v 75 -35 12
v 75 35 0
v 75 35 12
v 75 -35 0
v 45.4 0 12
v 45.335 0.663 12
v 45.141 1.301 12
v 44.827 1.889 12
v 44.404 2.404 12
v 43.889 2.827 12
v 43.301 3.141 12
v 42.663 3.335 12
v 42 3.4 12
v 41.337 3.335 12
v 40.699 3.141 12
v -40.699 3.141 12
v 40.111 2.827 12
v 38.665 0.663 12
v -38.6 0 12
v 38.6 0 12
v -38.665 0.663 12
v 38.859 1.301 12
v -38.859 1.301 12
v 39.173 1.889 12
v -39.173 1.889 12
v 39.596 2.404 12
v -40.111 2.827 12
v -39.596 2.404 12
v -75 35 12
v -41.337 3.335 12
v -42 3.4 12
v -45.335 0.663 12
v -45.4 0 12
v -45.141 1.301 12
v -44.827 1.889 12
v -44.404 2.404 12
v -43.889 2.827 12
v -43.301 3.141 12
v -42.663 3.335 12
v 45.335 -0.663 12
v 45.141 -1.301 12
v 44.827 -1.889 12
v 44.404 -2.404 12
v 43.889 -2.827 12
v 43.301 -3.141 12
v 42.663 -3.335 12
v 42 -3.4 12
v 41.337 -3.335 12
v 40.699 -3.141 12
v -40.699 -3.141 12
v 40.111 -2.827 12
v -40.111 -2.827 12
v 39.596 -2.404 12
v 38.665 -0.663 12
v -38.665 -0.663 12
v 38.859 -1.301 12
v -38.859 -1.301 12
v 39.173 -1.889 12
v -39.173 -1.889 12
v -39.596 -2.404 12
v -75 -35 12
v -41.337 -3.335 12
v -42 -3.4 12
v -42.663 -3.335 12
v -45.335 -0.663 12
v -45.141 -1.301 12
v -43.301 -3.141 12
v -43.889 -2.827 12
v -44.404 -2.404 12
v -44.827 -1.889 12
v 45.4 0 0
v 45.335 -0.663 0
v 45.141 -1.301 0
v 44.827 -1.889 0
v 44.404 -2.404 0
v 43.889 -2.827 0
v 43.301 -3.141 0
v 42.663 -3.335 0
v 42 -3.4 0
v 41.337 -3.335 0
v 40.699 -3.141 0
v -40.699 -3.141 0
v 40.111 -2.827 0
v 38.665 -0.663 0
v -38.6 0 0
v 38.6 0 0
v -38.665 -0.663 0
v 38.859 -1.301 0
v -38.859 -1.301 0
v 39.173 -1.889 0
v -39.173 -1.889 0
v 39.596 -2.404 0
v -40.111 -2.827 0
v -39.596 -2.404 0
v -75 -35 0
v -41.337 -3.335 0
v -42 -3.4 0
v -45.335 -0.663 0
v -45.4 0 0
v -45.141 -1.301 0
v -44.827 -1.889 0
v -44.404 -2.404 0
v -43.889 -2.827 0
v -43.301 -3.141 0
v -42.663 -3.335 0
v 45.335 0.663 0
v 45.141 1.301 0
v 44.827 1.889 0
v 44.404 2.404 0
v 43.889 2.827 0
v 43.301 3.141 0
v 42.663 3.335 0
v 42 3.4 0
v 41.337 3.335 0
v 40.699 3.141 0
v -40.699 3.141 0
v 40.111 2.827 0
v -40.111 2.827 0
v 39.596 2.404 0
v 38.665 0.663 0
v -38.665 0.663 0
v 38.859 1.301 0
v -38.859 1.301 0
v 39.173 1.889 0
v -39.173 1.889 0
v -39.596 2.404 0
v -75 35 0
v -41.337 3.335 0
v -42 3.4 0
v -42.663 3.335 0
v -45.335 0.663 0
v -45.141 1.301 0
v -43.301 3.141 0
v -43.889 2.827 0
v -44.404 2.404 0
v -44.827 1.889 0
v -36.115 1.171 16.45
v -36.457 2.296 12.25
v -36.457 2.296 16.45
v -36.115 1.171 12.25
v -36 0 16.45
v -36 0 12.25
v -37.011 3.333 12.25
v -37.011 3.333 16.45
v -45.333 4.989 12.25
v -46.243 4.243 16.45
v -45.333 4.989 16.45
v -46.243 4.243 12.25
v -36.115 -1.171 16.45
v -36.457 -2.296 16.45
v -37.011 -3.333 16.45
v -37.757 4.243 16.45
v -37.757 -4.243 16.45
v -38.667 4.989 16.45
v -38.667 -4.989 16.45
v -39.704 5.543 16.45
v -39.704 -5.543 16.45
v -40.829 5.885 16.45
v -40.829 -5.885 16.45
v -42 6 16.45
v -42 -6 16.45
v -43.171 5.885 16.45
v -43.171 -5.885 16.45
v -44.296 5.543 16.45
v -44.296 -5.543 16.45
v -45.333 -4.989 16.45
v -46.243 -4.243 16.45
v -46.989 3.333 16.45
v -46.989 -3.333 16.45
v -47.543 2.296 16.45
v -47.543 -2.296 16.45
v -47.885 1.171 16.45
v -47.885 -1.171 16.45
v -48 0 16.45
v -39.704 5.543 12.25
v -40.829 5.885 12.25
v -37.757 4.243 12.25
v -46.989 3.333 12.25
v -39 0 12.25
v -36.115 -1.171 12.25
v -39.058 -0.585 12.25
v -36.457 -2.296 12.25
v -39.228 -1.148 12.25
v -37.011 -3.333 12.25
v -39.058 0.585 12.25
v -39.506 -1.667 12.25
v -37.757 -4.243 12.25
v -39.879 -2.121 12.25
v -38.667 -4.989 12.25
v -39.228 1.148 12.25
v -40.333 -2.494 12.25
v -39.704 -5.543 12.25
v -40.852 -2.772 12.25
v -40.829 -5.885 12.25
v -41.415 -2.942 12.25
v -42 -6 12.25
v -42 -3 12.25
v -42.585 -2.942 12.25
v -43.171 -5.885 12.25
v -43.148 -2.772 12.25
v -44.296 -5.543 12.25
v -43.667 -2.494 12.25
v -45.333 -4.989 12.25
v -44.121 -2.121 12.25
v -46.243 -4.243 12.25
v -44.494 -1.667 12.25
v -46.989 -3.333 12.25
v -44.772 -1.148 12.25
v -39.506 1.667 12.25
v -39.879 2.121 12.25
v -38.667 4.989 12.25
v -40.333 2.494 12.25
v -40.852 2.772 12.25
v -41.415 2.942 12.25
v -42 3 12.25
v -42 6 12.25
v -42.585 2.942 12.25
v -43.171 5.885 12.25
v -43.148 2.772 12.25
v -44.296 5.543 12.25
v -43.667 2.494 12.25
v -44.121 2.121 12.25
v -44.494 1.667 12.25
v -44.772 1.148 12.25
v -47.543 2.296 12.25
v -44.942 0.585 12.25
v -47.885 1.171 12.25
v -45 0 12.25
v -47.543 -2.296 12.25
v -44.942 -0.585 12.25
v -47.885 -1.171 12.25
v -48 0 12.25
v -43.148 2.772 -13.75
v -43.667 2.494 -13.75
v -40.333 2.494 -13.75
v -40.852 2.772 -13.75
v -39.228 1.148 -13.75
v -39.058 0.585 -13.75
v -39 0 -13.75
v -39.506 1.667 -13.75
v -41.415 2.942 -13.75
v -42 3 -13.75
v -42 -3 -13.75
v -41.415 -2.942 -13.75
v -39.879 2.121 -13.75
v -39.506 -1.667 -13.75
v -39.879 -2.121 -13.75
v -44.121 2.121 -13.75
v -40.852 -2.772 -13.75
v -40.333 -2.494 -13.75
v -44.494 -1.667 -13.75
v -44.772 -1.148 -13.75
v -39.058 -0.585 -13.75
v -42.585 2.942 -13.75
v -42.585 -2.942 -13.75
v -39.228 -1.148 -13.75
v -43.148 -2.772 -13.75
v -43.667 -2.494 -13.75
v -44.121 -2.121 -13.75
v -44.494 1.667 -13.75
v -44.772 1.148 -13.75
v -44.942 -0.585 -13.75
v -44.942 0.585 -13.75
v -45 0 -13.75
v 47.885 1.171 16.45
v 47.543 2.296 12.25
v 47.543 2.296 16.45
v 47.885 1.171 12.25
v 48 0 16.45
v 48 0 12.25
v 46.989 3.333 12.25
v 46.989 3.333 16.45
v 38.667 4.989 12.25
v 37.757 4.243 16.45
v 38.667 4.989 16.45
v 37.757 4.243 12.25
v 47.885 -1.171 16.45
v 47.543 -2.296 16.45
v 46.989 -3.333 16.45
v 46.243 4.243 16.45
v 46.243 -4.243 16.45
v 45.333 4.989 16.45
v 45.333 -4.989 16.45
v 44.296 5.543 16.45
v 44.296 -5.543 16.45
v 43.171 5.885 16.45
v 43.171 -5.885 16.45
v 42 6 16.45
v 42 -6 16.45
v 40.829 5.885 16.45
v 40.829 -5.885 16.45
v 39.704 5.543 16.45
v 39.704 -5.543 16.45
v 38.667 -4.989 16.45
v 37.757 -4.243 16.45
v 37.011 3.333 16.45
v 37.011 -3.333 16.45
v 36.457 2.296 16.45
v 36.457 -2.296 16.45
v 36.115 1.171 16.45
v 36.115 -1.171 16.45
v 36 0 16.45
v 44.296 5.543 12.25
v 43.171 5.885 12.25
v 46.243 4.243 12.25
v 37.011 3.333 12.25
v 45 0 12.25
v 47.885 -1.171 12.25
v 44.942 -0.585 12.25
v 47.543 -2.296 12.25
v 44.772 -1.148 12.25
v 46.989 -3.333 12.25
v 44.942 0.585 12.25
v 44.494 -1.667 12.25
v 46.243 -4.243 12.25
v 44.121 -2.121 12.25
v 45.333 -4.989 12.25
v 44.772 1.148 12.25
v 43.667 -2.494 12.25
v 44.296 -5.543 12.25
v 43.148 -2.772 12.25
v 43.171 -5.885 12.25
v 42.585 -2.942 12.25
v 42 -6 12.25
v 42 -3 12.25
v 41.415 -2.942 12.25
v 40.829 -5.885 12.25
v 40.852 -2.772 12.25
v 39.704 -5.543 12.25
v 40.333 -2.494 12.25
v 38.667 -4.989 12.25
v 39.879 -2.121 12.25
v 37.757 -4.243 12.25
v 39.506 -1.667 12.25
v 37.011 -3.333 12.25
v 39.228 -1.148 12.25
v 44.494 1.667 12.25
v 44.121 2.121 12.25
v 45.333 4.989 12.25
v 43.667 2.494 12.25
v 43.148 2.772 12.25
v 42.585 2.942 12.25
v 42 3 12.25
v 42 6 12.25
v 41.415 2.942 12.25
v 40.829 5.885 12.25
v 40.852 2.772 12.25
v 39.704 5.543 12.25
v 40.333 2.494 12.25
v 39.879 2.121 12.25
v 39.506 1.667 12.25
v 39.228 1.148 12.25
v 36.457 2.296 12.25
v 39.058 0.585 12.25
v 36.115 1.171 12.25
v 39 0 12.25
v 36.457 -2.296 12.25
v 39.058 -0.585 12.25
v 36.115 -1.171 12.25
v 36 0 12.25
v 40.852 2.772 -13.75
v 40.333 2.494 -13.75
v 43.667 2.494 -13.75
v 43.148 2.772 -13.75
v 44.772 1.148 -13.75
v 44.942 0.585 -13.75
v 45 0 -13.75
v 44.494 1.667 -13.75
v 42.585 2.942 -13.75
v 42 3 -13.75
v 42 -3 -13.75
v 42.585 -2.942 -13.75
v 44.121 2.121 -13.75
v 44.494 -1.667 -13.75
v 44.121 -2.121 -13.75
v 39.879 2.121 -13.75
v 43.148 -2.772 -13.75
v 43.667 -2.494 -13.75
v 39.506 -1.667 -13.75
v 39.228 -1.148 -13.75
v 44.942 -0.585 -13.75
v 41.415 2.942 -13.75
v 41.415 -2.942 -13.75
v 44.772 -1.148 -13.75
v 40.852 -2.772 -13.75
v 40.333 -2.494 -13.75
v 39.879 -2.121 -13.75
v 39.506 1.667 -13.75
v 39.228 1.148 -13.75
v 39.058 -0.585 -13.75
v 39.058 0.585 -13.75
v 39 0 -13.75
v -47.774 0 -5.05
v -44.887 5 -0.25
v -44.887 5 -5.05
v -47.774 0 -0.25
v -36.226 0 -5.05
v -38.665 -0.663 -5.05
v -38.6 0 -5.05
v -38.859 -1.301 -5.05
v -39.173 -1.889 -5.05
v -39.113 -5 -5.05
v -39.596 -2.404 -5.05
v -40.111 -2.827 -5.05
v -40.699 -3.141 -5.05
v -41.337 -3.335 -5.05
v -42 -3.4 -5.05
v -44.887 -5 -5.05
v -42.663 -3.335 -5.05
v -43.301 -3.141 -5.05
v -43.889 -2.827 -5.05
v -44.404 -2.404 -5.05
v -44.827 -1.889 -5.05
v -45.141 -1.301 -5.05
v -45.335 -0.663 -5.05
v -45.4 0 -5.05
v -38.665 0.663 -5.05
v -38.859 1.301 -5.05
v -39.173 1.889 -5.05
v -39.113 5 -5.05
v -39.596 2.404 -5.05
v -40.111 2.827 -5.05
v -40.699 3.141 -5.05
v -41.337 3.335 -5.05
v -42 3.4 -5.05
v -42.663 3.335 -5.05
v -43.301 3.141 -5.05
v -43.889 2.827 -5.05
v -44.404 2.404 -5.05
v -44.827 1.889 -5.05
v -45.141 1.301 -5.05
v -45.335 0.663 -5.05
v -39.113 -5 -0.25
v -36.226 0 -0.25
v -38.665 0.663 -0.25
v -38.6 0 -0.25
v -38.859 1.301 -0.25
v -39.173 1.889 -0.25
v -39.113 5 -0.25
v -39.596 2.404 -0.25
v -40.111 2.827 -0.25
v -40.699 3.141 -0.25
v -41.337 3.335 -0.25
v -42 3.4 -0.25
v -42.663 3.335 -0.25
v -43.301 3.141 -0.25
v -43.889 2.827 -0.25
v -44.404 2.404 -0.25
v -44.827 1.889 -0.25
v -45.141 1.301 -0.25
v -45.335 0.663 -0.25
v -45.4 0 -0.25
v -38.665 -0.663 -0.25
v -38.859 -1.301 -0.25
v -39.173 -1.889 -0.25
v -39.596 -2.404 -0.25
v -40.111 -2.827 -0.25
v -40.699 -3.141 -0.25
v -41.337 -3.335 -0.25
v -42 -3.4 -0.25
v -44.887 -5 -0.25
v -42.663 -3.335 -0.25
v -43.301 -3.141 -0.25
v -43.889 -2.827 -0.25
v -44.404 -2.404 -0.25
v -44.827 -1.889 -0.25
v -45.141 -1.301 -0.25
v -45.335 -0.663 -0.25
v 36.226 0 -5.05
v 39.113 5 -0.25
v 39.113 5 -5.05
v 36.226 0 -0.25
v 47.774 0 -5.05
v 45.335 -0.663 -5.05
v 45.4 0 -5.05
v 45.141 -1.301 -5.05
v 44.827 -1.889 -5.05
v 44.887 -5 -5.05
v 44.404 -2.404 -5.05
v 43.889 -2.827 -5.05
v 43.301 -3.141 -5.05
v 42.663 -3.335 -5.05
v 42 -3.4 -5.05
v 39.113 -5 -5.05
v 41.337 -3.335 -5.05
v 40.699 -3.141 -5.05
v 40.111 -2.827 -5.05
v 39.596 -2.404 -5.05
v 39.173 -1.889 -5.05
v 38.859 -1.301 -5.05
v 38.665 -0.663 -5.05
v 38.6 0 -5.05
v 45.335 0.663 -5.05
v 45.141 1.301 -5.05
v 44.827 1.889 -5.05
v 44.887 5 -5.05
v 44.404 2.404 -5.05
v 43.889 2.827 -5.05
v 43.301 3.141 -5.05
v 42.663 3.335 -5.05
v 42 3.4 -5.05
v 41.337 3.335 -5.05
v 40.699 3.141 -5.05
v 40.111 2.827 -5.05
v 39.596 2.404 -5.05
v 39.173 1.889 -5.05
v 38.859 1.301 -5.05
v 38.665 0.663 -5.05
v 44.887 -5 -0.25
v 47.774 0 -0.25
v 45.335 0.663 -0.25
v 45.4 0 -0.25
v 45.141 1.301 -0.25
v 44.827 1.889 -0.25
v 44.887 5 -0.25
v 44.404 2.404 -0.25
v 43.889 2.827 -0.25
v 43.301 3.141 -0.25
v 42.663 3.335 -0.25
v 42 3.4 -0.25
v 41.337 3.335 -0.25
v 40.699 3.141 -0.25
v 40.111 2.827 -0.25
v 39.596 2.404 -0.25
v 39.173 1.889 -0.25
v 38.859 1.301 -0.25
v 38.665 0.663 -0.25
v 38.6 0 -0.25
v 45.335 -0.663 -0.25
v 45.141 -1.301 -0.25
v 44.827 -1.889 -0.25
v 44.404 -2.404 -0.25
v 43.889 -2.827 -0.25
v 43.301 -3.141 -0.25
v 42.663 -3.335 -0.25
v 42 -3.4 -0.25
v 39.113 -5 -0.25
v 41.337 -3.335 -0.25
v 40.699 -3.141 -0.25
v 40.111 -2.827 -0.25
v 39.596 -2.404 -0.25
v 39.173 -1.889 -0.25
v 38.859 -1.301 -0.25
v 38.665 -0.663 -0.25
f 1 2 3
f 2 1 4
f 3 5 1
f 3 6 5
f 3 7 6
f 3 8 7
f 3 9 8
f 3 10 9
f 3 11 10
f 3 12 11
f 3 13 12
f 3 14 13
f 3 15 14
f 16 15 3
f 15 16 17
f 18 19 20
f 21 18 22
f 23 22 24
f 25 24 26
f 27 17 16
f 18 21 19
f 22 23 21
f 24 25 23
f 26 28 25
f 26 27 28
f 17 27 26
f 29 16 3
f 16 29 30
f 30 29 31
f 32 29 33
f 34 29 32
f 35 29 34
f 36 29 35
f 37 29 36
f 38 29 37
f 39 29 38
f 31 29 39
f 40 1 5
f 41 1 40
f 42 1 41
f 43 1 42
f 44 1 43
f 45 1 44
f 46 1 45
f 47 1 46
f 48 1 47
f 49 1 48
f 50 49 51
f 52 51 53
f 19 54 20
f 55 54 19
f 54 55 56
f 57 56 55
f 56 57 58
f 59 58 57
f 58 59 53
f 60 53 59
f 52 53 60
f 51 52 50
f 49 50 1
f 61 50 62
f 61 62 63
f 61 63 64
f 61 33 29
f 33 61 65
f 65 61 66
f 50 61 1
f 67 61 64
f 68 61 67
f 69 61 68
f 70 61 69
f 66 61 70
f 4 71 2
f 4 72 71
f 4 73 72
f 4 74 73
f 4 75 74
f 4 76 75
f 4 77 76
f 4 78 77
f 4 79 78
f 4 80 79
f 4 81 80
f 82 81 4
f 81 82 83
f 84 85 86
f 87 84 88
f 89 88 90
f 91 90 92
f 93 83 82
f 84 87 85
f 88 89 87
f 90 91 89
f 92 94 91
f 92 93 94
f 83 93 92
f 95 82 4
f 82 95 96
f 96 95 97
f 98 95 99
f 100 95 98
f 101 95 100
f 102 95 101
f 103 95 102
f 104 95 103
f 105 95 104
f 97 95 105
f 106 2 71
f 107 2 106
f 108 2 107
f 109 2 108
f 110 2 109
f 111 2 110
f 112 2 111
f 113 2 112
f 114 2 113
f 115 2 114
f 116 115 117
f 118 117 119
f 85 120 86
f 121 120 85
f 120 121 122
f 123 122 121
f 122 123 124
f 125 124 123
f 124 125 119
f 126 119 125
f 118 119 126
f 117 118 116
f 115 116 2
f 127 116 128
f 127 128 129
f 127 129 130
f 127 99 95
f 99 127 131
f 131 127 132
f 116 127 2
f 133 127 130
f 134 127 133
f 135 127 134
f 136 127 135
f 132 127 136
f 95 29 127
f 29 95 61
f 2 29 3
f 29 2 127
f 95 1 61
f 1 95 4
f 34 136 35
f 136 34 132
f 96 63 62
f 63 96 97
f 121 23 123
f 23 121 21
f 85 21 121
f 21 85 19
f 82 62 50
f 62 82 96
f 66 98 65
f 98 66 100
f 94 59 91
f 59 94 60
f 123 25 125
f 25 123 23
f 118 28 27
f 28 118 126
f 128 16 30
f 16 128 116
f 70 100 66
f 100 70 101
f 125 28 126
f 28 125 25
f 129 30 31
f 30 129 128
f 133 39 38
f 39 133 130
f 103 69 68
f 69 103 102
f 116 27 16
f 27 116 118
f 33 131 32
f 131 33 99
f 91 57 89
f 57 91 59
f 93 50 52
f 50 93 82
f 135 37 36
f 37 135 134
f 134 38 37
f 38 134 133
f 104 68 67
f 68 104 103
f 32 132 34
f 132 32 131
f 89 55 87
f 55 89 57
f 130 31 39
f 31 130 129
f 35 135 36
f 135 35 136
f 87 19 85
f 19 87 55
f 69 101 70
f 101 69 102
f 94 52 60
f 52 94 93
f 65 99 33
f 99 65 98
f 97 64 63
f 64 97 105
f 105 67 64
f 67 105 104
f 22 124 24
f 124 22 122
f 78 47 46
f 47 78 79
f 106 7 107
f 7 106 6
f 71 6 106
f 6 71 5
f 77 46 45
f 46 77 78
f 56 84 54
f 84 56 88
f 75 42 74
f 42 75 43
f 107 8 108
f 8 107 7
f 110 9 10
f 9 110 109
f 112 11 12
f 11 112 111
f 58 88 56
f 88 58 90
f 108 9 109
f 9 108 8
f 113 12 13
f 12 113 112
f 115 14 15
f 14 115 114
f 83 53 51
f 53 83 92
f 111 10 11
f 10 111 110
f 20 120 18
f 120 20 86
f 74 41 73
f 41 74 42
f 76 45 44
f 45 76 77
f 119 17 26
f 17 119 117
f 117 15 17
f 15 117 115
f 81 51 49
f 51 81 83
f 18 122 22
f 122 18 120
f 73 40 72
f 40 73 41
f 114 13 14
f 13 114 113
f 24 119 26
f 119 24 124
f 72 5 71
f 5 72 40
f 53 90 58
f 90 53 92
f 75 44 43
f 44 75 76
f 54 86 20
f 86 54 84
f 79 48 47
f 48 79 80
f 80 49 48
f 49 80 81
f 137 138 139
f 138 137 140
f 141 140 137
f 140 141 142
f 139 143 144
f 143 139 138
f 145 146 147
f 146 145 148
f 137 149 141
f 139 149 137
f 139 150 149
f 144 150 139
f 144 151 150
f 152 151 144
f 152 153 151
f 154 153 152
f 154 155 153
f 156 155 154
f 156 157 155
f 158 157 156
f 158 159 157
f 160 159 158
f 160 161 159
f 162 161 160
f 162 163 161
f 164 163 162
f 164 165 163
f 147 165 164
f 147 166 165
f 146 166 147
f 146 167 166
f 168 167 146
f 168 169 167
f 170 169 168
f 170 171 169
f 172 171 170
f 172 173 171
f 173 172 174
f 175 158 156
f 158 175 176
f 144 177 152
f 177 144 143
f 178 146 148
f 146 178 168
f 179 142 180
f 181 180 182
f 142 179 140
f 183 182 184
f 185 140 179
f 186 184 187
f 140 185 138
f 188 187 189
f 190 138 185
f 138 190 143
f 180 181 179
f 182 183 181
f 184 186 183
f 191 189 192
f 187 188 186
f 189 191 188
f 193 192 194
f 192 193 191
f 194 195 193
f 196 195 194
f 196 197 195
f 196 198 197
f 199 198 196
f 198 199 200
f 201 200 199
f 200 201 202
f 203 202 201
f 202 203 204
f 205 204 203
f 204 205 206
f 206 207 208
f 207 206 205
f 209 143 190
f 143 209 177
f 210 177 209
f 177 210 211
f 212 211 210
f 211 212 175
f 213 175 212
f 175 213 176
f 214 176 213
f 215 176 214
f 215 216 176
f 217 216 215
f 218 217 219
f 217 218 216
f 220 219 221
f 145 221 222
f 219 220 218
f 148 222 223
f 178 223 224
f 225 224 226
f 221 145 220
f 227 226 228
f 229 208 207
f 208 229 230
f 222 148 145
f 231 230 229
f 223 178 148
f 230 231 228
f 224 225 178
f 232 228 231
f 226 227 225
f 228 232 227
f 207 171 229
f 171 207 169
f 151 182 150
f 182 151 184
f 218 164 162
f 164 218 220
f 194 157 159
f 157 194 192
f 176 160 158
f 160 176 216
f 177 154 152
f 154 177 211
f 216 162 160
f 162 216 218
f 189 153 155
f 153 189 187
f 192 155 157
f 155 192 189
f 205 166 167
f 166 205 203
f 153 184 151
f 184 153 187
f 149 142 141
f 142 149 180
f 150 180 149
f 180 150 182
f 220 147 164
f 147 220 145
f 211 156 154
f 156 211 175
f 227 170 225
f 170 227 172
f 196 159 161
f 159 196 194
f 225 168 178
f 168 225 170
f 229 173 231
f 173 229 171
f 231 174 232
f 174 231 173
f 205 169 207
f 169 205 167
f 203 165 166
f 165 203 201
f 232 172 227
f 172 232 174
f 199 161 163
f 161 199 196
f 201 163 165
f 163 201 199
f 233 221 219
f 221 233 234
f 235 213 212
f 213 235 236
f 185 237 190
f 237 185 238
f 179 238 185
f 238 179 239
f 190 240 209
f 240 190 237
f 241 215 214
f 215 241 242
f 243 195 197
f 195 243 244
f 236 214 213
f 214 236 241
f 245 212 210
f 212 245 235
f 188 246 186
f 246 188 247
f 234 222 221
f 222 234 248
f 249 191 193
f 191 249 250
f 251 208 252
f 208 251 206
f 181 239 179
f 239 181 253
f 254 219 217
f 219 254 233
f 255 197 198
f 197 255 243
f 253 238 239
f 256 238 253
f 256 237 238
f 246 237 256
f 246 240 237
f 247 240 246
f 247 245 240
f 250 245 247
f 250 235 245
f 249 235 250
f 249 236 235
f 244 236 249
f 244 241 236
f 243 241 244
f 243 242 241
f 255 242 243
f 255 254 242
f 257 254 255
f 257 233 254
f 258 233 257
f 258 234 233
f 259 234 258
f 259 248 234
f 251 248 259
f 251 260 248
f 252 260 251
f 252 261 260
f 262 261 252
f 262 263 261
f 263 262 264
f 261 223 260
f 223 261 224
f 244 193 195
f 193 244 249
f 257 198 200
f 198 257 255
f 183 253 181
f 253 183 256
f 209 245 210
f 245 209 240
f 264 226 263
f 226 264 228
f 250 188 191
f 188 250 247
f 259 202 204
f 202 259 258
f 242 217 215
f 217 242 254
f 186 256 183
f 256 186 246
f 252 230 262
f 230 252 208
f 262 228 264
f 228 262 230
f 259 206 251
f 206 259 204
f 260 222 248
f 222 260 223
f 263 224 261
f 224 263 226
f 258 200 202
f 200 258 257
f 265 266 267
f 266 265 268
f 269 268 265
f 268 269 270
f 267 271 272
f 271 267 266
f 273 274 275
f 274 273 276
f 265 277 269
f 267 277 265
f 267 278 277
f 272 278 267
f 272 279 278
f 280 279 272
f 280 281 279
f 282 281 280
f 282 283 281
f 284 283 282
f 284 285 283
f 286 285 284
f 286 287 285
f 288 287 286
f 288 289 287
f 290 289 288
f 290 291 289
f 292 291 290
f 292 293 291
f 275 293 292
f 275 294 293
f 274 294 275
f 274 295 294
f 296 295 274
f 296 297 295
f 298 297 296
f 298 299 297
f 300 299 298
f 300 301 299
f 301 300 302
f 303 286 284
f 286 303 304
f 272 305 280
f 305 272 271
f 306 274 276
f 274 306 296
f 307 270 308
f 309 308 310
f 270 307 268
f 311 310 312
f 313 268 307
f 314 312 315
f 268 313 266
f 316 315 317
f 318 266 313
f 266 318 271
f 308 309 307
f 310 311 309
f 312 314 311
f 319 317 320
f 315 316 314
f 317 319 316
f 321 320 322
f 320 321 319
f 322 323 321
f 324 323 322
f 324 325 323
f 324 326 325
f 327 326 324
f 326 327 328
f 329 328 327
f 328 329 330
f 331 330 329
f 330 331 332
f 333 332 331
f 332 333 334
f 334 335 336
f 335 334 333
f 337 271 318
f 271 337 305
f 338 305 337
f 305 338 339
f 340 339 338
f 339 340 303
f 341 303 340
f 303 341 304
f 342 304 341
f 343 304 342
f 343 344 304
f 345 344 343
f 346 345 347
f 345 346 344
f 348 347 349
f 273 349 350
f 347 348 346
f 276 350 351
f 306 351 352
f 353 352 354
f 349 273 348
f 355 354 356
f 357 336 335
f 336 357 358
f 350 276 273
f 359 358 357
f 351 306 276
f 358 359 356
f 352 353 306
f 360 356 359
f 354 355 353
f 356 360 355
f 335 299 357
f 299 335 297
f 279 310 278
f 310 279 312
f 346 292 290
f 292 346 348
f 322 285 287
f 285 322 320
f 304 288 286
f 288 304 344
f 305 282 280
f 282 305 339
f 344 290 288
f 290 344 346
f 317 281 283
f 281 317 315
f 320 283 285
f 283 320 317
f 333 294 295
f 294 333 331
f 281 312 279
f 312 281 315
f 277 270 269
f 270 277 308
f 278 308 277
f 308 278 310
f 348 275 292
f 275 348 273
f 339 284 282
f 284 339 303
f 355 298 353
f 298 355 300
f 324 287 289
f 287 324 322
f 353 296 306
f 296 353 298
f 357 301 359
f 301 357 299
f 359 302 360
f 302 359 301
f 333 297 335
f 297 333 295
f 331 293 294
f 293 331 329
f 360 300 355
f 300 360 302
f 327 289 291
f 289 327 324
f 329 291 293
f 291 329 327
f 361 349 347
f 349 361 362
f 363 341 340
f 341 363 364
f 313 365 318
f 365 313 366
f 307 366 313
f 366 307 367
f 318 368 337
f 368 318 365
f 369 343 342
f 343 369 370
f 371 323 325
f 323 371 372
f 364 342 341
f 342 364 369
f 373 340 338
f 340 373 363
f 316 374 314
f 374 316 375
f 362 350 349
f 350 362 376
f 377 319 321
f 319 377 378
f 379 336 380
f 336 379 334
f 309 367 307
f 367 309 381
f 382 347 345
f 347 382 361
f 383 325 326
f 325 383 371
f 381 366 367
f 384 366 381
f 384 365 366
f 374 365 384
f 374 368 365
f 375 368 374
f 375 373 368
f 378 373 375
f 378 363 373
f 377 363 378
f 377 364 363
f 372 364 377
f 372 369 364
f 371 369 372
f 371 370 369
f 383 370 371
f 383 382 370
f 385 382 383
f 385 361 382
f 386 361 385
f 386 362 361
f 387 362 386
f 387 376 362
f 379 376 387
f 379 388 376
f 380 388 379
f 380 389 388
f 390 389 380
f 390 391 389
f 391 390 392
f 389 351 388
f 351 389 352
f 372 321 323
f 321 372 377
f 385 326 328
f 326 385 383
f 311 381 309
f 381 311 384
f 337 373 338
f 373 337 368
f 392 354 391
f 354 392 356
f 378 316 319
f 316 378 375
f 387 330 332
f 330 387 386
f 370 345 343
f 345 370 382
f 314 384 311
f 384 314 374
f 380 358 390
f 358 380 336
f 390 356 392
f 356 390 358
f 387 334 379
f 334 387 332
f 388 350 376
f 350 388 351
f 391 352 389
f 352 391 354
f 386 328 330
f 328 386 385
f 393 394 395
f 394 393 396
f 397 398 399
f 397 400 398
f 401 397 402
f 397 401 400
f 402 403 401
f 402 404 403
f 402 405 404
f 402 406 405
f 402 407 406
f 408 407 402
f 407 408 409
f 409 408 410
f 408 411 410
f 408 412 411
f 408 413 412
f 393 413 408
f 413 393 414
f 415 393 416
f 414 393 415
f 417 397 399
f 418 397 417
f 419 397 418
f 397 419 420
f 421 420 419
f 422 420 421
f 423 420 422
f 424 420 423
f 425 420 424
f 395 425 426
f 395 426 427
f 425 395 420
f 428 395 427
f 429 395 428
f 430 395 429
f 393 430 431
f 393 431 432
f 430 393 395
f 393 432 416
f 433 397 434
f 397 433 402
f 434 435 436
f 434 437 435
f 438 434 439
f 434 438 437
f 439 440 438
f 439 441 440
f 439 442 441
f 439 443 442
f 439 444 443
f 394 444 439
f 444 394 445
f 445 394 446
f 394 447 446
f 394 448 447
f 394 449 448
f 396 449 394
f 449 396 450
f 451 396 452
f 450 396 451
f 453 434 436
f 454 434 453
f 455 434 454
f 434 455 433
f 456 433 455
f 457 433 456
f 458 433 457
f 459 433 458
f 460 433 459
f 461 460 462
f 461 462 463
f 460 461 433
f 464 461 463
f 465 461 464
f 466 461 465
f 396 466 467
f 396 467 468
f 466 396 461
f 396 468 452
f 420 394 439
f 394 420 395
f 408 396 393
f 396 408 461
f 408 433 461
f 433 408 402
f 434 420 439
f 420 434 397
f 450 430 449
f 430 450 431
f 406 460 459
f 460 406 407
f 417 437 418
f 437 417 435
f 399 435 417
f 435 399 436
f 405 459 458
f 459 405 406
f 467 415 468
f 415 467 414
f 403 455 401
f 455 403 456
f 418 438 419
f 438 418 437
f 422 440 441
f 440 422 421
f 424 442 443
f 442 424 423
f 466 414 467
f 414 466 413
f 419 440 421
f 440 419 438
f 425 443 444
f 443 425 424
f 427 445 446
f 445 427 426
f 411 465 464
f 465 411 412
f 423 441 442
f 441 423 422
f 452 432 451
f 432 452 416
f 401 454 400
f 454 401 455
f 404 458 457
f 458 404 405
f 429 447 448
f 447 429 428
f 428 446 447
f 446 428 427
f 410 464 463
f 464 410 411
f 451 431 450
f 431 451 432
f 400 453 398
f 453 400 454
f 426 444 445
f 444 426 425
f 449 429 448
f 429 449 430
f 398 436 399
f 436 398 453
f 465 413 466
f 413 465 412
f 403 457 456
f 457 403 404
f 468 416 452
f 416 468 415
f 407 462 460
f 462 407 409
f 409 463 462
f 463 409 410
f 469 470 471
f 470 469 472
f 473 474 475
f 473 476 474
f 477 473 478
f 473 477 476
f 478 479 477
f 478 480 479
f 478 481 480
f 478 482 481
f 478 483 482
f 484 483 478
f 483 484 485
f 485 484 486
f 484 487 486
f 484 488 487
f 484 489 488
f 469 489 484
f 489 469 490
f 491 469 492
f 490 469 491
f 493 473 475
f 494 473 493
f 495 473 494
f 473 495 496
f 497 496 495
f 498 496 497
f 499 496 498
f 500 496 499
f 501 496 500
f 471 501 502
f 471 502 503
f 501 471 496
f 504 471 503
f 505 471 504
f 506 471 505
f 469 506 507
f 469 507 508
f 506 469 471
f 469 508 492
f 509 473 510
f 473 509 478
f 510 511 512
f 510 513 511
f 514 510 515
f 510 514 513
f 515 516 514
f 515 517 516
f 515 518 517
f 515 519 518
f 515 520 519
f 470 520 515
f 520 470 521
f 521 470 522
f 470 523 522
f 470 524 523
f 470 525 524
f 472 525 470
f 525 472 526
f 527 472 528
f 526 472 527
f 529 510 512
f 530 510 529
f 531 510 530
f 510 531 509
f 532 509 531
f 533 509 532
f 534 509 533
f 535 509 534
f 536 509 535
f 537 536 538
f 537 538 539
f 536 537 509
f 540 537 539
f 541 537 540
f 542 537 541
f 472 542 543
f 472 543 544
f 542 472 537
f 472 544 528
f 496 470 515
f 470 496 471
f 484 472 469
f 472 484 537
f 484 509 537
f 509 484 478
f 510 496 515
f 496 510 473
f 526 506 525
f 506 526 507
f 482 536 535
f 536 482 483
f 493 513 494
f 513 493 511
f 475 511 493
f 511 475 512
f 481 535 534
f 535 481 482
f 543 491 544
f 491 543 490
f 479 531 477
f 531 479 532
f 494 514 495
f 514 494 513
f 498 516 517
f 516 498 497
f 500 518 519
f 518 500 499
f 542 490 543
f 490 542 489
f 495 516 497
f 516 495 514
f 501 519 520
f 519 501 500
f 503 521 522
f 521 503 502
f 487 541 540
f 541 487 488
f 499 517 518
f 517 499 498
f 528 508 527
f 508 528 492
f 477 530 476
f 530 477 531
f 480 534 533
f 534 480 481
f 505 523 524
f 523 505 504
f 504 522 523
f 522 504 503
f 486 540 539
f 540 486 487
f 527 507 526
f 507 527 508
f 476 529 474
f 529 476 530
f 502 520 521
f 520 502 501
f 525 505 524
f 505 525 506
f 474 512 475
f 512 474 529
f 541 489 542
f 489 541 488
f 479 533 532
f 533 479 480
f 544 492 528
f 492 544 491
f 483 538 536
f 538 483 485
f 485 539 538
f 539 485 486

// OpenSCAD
$fn = 32;

// ------------------------------------------------------------------------
// Bolted plate: 150 x 70 x 12 mm plate, 2 fasteners
// Every part is its own module, assembly() places them once.
// ------------------------------------------------------------------------

// --- part 1 ---
module plate() {
  difference() {
    translate([-75, -35, 0]) cube([150, 70, 12]);
    translate([-42, 0, -1]) cylinder(h = 14, d = 6.8);
    translate([42, 0, -1]) cylinder(h = 14, d = 6.8);
  }
}

// --- part 2 ---
module bolt1() {
  cylinder(h = 4.2, d = 12);
  translate([0, 0, -26]) cylinder(h = 26, d = 6);
}

// --- part 3 ---
module bolt2() {
  cylinder(h = 4.2, d = 12);
  translate([0, 0, -26]) cylinder(h = 26, d = 6);
}

// --- part 4 ---
module nut1() {
  difference() {
    linear_extrude(height = 4.8) polygon(points = [[5.774, 0], [2.887, 5], [-2.887, 5], [-5.774, 0], [-2.887, -5], [2.887, -5]]);
    translate([0, 0, -1]) cylinder(h = 6.8, d = 6.8);
  }
}

// --- part 5 ---
module nut2() {
  difference() {
    linear_extrude(height = 4.8) polygon(points = [[5.774, 0], [2.887, 5], [-2.887, 5], [-5.774, 0], [-2.887, -5], [2.887, -5]]);
    translate([0, 0, -1]) cylinder(h = 6.8, d = 6.8);
  }
}

// --- assembly ---
module assembly() {
  translate([0, 0, 0]) rotate([0, 0, 0]) plate();
  translate([-42, 0, 12.25]) rotate([0, 0, 0]) bolt1();
  translate([42, 0, 12.25]) rotate([0, 0, 0]) bolt2();
  translate([-42, 0, -5.05]) rotate([0, 0, 0]) nut1();
  translate([42, 0, -5.05]) rotate([0, 0, 0]) nut2();
}

assembly();
